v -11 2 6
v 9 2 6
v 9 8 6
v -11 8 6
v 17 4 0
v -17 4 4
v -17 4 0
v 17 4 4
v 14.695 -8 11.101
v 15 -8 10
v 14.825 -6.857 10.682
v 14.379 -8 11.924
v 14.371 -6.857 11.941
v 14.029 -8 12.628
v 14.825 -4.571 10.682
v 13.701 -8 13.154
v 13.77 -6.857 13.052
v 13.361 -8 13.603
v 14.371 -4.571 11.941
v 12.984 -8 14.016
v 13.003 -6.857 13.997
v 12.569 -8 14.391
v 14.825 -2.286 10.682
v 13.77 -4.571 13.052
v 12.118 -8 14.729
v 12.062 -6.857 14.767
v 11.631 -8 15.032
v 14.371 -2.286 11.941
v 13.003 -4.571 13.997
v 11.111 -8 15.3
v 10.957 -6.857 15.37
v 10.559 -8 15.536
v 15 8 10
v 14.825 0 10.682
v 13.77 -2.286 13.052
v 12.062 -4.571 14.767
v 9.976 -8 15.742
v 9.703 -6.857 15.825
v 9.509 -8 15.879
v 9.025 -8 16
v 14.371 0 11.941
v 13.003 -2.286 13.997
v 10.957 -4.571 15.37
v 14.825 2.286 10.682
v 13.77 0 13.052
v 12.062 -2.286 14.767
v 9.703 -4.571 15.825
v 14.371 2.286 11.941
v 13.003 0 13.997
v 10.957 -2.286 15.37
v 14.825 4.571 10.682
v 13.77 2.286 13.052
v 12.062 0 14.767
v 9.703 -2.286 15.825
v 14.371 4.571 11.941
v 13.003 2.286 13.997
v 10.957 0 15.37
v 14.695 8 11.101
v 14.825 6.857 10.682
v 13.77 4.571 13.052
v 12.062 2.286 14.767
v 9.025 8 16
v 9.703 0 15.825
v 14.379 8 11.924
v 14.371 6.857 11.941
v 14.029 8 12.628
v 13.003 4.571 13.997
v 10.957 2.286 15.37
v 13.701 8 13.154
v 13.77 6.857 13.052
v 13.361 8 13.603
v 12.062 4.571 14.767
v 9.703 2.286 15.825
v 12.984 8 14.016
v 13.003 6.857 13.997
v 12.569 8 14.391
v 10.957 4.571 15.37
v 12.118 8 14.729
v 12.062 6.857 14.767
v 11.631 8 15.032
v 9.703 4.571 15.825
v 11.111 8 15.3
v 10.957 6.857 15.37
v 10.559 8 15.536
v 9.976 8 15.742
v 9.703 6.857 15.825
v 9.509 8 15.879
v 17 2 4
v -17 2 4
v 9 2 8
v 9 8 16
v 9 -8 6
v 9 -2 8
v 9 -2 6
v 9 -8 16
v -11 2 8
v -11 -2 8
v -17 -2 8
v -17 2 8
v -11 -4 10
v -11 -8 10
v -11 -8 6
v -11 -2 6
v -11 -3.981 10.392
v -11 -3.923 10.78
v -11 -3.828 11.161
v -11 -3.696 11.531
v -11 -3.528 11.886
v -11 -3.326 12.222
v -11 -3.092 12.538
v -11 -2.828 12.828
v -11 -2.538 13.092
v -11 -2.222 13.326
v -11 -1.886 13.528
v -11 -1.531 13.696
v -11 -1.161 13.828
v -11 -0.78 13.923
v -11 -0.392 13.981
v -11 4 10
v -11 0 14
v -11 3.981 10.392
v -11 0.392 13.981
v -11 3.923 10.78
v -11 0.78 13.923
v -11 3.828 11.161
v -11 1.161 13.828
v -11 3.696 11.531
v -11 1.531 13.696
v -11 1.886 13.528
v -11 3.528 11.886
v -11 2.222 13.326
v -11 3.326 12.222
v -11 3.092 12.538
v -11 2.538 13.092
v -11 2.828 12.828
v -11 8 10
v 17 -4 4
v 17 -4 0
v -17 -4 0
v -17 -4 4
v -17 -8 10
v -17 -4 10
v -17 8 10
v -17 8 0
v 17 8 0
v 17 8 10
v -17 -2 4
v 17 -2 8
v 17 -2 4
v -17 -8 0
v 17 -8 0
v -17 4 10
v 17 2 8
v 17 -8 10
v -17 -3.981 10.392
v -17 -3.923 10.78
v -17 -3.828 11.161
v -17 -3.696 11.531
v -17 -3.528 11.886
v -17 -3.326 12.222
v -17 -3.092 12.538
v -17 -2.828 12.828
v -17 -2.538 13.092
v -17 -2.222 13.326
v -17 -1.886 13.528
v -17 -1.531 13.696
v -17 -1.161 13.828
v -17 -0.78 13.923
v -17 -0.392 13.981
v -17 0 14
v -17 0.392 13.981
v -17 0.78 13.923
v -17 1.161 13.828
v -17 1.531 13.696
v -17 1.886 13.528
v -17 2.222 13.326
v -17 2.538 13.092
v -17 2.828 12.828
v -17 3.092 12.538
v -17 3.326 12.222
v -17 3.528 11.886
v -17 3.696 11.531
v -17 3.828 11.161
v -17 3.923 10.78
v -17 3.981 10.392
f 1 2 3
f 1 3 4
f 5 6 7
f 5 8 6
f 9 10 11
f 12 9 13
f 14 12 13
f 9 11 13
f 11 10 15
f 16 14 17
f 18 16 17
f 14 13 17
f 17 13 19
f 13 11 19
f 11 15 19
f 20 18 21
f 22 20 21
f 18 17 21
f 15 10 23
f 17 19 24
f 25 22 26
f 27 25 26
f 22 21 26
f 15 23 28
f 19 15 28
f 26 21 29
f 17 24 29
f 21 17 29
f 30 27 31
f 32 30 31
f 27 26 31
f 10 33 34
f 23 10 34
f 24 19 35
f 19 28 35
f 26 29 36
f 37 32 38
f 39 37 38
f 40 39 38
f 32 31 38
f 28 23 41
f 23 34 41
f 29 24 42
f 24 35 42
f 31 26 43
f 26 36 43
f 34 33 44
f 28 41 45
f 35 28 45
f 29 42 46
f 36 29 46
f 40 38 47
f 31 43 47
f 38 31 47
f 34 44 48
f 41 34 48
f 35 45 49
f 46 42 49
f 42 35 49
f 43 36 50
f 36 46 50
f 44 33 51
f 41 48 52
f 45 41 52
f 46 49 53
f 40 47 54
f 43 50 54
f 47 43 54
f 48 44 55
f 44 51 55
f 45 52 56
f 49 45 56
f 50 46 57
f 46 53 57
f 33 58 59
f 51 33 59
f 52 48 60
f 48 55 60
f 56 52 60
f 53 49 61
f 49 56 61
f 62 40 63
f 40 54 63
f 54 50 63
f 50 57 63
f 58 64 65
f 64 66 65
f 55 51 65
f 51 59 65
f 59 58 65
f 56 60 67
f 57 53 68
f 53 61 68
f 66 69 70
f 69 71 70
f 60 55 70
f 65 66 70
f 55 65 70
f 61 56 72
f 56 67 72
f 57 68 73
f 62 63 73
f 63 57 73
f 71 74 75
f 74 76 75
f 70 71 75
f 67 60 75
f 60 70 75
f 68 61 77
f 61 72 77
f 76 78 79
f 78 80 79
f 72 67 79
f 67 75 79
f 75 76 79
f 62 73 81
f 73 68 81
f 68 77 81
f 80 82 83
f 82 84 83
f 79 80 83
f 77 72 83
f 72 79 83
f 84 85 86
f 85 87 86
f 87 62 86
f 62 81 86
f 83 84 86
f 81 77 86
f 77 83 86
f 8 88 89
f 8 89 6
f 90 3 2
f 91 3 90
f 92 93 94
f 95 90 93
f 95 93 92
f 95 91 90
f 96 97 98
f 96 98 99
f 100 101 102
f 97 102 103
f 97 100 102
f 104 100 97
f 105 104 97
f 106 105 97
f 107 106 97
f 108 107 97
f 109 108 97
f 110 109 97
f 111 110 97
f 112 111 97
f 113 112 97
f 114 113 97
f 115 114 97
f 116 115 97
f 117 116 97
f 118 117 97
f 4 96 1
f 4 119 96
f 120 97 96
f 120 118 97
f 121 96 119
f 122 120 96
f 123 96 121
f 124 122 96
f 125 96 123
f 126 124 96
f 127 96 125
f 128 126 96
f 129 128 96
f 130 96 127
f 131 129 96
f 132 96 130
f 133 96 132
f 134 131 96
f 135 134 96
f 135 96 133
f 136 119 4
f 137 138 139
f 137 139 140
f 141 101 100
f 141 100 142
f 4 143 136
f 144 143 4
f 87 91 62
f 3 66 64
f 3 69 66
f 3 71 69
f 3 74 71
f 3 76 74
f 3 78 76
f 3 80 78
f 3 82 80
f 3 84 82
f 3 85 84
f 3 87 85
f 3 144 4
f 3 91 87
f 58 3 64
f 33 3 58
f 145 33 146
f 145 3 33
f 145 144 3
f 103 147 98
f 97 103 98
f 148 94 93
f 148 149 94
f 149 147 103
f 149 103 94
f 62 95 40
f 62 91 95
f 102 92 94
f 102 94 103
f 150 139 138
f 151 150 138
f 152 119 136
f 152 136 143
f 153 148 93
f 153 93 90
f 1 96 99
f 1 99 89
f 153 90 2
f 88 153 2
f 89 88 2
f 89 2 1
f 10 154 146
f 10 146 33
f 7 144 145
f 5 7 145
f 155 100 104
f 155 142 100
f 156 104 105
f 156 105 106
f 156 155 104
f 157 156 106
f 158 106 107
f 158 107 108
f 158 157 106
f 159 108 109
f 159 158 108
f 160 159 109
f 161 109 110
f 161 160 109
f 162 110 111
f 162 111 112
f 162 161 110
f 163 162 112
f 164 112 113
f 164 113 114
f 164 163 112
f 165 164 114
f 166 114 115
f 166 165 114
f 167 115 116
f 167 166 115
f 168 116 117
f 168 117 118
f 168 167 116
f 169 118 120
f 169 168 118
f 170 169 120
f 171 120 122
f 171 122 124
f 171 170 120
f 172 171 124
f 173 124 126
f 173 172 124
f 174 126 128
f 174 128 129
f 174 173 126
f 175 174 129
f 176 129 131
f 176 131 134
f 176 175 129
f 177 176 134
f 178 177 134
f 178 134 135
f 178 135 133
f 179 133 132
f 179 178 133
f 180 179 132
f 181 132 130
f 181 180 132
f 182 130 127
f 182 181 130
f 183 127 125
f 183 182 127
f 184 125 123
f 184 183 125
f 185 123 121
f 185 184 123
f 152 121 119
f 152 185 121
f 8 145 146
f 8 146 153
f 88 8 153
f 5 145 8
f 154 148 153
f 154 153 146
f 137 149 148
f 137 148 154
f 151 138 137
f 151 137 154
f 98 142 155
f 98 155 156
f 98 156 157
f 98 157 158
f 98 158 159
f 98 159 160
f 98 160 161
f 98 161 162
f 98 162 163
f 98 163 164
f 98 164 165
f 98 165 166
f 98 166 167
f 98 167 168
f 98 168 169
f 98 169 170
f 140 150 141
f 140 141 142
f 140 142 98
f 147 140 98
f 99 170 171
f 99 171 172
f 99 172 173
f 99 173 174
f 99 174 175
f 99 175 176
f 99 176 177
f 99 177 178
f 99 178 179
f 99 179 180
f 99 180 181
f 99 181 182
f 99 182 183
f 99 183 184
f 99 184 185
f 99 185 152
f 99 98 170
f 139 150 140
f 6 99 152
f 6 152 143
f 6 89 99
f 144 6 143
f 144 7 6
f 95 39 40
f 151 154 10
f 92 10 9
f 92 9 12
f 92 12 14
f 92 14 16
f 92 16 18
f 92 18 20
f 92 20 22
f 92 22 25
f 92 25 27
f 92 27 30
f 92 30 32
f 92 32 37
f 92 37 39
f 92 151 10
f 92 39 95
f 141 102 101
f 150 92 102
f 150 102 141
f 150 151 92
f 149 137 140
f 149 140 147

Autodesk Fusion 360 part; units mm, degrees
sketch "Sketch1" plane through (0, 0, 0) normal (0, 0, 1) x (1, 0, 0)
  line L0 (17, -8) -> (-17, -8)
  line L1 (-17, -8) -> (-17, 8)
  line L2 (-17, 8) -> (17, 8)
  line L3 (17, 8) -> (17, -8)
  line L4 (17, -8) -> (-17, 8) construction
  line L5 (-17, -8) -> (17, 8) construction
  dimension "d1" = 34
  dimension "d2" = 16
extrude "Extrude1" add sketch "Sketch1" along normal blind 16
sketch "Sketch2" plane through (0, 0, 16) normal (0, 0, 1) x (-1, 0, 0)
  line L0 (-17, -8) -> (17, -8)
  line L1 (17, -8) -> (17, 8)
  line L2 (17, 8) -> (-17, 8)
  line L3 (-17, 8) -> (-17, -8)
  line L4 (-17, 8) -> (-15, 8)
  line L5 (-15, 8) -> (-15, -8)
  line L6 (-15, -8) -> (-17, -8)
  line L7 (-17, -8) -> (-17, 8)
  dimension "d5" = 2
extrude "Extrude2" cut sketch "Sketch2" against normal blind 6 contours L0 L2 L3 L4 L5 L6 L7
sketch "Sketch3" plane through (0, 8, 0) normal (0, 1, 0) x (-1, 0, 0)
  line L0 (-15, 16) -> (-15, 10)
  line L1 (-15, 10) -> (-17, 10)
  line L2 (-17, 10) -> (-17, 0)
  line L3 (-17, 0) -> (17, 0)
  line L4 (17, 0) -> (17, 16)
  line L5 (17, 16) -> (-15, 16)
  spline S0 degree 5 poles (-15, 10) (-14.9556, 10.1956) (-14.8603, 10.5802) (-14.6976, 11.1373) (-14.4407, 11.8398) (-14.0484, 12.6464) (-13.5785, 13.3749) (-13.0248, 14.0189) (-12.3836, 14.5751) (-11.6585, 15.0467) (-10.8558, 15.4401) (-10.1566, 15.6975) (-9.6022, 15.8603) (-9.2194, 15.9556) (-9.0247, 16) knots 0 0 0 0 0 0 0.1 0.2 0.3 0.4 0.5 0.6 0.7 0.8 0.9 1 1 1 1 1 1
  point P0 (-13, 14)
extrude "Extrude3" cut sketch "Sketch3" against normal blind 16 contours L0 L5 S0
sketch "Sketch4" plane through (17, 0, 0) normal (1, 0, 0) x (0, 1, 0)
  line L0 (8, 10) -> (-8, 10)
  line L1 (-8, 10) -> (-8, 0)
  line L2 (-8, 0) -> (8, 0)
  line L3 (8, 0) -> (8, 10)
  line L4 (4, 0) -> (-4, 0)
  line L5 (-4, 0) -> (-4, 4)
  line L6 (-4, 4) -> (4, 4)
  line L7 (4, 4) -> (4, 0)
  line L8 (4, 0) -> (-4, 4) construction
  line L9 (-4, 0) -> (4, 4) construction
  point P0 (0, 2)
  dimension "d10" = 8
  dimension "d11" = 4
extrude "Extrude4" cut sketch "Sketch4" against normal blind 34 contours L2 L4 L5 L6 L7
sketch "Sketch5" plane through (17, 0, 0) normal (1, 0, 0) x (0, 1, 0)
  line L0 (4, 4) -> (4, 0)
  line L1 (4, 0) -> (8, 0)
  line L2 (8, 0) -> (8, 10)
  line L3 (8, 10) -> (-8, 10)
  line L4 (-8, 10) -> (-8, 0)
  line L5 (-8, 0) -> (-4, 0)
  line L6 (-4, 0) -> (-4, 4)
  line L7 (-4, 4) -> (4, 4)
  line L8 (2, 4) -> (-2, 4)
  line L9 (-2, 4) -> (-2, 8)
  line L10 (-2, 8) -> (2, 8)
  line L11 (2, 8) -> (2, 4)
  line L12 (2, 4) -> (-2, 8) construction
  line L13 (-2, 4) -> (2, 8) construction
  point P0 (0, 6)
  dimension "d14" = 4
  dimension "d15" = 4
extrude "Extrude5" cut sketch "Sketch5" against normal blind 34 contours L7 L8 L9 L10 L11
sketch "Sketch6" plane through (0, 0, 16) normal (0, 0, 1) x (-1, 0, 0)
  line L0 (-9.0247, 8) -> (-9.0247, -8)
  line L1 (-9.0247, -8) -> (17, -8)
  line L2 (17, -8) -> (17, 8)
  line L3 (17, 8) -> (-9.0247, 8)
  line L4 (-9, -2) -> (11, -2)
  line L5 (11, -2) -> (11, -8)
  line L6 (11, -8) -> (-9, -8)
  line L7 (-9, -8) -> (-9, -2)
  line L8 (-9, -2) -> (11, -8) construction
  line L9 (11, -2) -> (-9, -8) construction
  point P0 (1, -5)
  dimension "d18" = 20
  dimension "d19" = 6
extrude "Extrude6" cut sketch "Sketch6" against normal blind 10 contours L1 L4 L5 L6 L7
sketch "Sketch7" plane through (0, 0, 16) normal (0, 0, 1) x (-1, 0, 0)
  line L0 (-9, -8) -> (-9, -2)
  line L1 (-9, -2) -> (11, -2)
  line L2 (11, -2) -> (11, -8)
  line L3 (11, -8) -> (17, -8)
  line L4 (17, -8) -> (17, 8)
  line L5 (17, 8) -> (-9.0247, 8)
  line L6 (-9.0247, 8) -> (-9.0247, -8)
  line L7 (-9.0247, -8) -> (-9, -8)
  line L8 (11, 2) -> (-9, 2)
  line L9 (-9, 2) -> (-9, 8)
  line L10 (-9, 8) -> (11, 8)
  line L11 (11, 8) -> (11, 2)
  line L12 (11, 2) -> (-9, 8) construction
  line L13 (-9, 2) -> (11, 8) construction
  point P0 (1, 5)
  dimension "d22" = 20
  dimension "d23" = 6
extrude "Extrude7" cut sketch "Sketch7" against normal blind 10 contours L5 L8 L9 L10 L11
sketch "Sketch8" plane through (0, 0, 16) normal (0, 0, 1) x (-1, 0, 0)
  line L0 (11, 8) -> (11, 2)
  line L1 (11, 2) -> (-9, 2)
  line L2 (-9, 2) -> (-9, 8)
  line L3 (-9, 8) -> (-9.0247, 8)
  line L4 (-9.0247, 8) -> (-9.0247, -8)
  line L5 (-9.0247, -8) -> (-9, -8)
  line L6 (-9, -8) -> (-9, -2)
  line L7 (-9, -2) -> (11, -2)
  line L8 (11, -2) -> (11, -8)
  line L9 (11, -8) -> (17, -8)
  line L10 (17, -8) -> (17, 8)
  line L11 (17, 8) -> (11, 8)
  line L12 (11, -2) -> (-9, -2)
  line L13 (-9, -2) -> (-9, 2)
  line L14 (-9, 2) -> (11, 2)
  line L15 (11, 2) -> (11, -2)
  line L16 (11, -2) -> (-9, 2) construction
  line L17 (-9, -2) -> (11, 2) construction
  point P0 (1, 0)
extrude "Extrude8" cut sketch "Sketch8" against normal blind 8 contours L1 L7 L12 L13 L14 L15
sketch "Sketch9" plane through (0, 0, 16) normal (0, 0, 1) x (-1, 0, 0)
  line L0 (11, 8) -> (11, -8)
  line L1 (11, -8) -> (17, -8)
  line L2 (17, -8) -> (17, 8)
  line L3 (17, 8) -> (11, 8)
  line L4 (11, -8) -> (17, -8)
  line L5 (17, -8) -> (17, -4)
  line L6 (17, -4) -> (11, -4)
  line L7 (11, -4) -> (11, -8)
  dimension "d28" = 4
extrude "Extrude9" cut sketch "Sketch9" against normal blind 6 contours L0 L1 L2 L4 L5 L6 L7
sketch "Sketch10" plane through (0, 0, 16) normal (0, 0, 1) x (-1, 0, 0)
  line L0 (11, -4) -> (17, -4)
  line L1 (17, -4) -> (17, 8)
  line L2 (17, 8) -> (11, 8)
  line L3 (11, 8) -> (11, -4)
  line L4 (11, 8) -> (17, 8)
  line L5 (17, 8) -> (17, 4)
  line L6 (17, 4) -> (11, 4)
  line L7 (11, 4) -> (11, 8)
  dimension "d31" = 6
  dimension "d32" = 4
extrude "Extrude10" cut sketch "Sketch10" against normal blind 6 contours L1 L2 L3 L4 L5 L6 L7
sketch "Sketch11" plane through (-11, 0, 0) normal (1, 0, 0) x (0, 1, 0)
  line L0 (-4, 16) -> (-4, 10)
  line L1 (-4, 10) -> (-8, 10)
  line L2 (-8, 10) -> (-8, 6)
  line L3 (-8, 6) -> (-2, 6)
  line L4 (-2, 6) -> (-2, 8)
  line L5 (-2, 8) -> (2, 8)
  line L6 (2, 8) -> (2, 6)
  line L7 (2, 6) -> (8, 6)
  line L8 (8, 6) -> (8, 10)
  line L9 (8, 10) -> (4, 10)
  line L10 (4, 10) -> (4, 16)
  line L11 (4, 16) -> (-4, 16)
sketch "Sketch12" plane through (-17, 0, 0) normal (-1, 0, 0) x (0, -1, 0)
  line L0 (4, 10) -> (4, 16)
  line L1 (4, 16) -> (-4, 16)
  line L2 (-4, 16) -> (-4, 10)
  line L3 (-4, 10) -> (-8, 10)
  line L4 (-8, 10) -> (-8, 0)
  line L5 (-8, 0) -> (-4, 0)
  line L6 (-4, 0) -> (-4, 4)
  line L7 (-4, 4) -> (-2, 4)
  line L8 (-2, 4) -> (-2, 8)
  line L9 (-2, 8) -> (2, 8)
  line L10 (2, 8) -> (2, 4)
  line L11 (2, 4) -> (4, 4)
  line L12 (4, 4) -> (4, 0)
  line L13 (4, 0) -> (8, 0)
  line L14 (8, 0) -> (8, 10)
  line L15 (8, 10) -> (4, 10)
  arc A0 (4, 10) -> (-4, 10) centre (0, 10) ccw
extrude "Extrude11" cut sketch "Sketch12" against normal blind 6 contours L0 L1 L2 A0
